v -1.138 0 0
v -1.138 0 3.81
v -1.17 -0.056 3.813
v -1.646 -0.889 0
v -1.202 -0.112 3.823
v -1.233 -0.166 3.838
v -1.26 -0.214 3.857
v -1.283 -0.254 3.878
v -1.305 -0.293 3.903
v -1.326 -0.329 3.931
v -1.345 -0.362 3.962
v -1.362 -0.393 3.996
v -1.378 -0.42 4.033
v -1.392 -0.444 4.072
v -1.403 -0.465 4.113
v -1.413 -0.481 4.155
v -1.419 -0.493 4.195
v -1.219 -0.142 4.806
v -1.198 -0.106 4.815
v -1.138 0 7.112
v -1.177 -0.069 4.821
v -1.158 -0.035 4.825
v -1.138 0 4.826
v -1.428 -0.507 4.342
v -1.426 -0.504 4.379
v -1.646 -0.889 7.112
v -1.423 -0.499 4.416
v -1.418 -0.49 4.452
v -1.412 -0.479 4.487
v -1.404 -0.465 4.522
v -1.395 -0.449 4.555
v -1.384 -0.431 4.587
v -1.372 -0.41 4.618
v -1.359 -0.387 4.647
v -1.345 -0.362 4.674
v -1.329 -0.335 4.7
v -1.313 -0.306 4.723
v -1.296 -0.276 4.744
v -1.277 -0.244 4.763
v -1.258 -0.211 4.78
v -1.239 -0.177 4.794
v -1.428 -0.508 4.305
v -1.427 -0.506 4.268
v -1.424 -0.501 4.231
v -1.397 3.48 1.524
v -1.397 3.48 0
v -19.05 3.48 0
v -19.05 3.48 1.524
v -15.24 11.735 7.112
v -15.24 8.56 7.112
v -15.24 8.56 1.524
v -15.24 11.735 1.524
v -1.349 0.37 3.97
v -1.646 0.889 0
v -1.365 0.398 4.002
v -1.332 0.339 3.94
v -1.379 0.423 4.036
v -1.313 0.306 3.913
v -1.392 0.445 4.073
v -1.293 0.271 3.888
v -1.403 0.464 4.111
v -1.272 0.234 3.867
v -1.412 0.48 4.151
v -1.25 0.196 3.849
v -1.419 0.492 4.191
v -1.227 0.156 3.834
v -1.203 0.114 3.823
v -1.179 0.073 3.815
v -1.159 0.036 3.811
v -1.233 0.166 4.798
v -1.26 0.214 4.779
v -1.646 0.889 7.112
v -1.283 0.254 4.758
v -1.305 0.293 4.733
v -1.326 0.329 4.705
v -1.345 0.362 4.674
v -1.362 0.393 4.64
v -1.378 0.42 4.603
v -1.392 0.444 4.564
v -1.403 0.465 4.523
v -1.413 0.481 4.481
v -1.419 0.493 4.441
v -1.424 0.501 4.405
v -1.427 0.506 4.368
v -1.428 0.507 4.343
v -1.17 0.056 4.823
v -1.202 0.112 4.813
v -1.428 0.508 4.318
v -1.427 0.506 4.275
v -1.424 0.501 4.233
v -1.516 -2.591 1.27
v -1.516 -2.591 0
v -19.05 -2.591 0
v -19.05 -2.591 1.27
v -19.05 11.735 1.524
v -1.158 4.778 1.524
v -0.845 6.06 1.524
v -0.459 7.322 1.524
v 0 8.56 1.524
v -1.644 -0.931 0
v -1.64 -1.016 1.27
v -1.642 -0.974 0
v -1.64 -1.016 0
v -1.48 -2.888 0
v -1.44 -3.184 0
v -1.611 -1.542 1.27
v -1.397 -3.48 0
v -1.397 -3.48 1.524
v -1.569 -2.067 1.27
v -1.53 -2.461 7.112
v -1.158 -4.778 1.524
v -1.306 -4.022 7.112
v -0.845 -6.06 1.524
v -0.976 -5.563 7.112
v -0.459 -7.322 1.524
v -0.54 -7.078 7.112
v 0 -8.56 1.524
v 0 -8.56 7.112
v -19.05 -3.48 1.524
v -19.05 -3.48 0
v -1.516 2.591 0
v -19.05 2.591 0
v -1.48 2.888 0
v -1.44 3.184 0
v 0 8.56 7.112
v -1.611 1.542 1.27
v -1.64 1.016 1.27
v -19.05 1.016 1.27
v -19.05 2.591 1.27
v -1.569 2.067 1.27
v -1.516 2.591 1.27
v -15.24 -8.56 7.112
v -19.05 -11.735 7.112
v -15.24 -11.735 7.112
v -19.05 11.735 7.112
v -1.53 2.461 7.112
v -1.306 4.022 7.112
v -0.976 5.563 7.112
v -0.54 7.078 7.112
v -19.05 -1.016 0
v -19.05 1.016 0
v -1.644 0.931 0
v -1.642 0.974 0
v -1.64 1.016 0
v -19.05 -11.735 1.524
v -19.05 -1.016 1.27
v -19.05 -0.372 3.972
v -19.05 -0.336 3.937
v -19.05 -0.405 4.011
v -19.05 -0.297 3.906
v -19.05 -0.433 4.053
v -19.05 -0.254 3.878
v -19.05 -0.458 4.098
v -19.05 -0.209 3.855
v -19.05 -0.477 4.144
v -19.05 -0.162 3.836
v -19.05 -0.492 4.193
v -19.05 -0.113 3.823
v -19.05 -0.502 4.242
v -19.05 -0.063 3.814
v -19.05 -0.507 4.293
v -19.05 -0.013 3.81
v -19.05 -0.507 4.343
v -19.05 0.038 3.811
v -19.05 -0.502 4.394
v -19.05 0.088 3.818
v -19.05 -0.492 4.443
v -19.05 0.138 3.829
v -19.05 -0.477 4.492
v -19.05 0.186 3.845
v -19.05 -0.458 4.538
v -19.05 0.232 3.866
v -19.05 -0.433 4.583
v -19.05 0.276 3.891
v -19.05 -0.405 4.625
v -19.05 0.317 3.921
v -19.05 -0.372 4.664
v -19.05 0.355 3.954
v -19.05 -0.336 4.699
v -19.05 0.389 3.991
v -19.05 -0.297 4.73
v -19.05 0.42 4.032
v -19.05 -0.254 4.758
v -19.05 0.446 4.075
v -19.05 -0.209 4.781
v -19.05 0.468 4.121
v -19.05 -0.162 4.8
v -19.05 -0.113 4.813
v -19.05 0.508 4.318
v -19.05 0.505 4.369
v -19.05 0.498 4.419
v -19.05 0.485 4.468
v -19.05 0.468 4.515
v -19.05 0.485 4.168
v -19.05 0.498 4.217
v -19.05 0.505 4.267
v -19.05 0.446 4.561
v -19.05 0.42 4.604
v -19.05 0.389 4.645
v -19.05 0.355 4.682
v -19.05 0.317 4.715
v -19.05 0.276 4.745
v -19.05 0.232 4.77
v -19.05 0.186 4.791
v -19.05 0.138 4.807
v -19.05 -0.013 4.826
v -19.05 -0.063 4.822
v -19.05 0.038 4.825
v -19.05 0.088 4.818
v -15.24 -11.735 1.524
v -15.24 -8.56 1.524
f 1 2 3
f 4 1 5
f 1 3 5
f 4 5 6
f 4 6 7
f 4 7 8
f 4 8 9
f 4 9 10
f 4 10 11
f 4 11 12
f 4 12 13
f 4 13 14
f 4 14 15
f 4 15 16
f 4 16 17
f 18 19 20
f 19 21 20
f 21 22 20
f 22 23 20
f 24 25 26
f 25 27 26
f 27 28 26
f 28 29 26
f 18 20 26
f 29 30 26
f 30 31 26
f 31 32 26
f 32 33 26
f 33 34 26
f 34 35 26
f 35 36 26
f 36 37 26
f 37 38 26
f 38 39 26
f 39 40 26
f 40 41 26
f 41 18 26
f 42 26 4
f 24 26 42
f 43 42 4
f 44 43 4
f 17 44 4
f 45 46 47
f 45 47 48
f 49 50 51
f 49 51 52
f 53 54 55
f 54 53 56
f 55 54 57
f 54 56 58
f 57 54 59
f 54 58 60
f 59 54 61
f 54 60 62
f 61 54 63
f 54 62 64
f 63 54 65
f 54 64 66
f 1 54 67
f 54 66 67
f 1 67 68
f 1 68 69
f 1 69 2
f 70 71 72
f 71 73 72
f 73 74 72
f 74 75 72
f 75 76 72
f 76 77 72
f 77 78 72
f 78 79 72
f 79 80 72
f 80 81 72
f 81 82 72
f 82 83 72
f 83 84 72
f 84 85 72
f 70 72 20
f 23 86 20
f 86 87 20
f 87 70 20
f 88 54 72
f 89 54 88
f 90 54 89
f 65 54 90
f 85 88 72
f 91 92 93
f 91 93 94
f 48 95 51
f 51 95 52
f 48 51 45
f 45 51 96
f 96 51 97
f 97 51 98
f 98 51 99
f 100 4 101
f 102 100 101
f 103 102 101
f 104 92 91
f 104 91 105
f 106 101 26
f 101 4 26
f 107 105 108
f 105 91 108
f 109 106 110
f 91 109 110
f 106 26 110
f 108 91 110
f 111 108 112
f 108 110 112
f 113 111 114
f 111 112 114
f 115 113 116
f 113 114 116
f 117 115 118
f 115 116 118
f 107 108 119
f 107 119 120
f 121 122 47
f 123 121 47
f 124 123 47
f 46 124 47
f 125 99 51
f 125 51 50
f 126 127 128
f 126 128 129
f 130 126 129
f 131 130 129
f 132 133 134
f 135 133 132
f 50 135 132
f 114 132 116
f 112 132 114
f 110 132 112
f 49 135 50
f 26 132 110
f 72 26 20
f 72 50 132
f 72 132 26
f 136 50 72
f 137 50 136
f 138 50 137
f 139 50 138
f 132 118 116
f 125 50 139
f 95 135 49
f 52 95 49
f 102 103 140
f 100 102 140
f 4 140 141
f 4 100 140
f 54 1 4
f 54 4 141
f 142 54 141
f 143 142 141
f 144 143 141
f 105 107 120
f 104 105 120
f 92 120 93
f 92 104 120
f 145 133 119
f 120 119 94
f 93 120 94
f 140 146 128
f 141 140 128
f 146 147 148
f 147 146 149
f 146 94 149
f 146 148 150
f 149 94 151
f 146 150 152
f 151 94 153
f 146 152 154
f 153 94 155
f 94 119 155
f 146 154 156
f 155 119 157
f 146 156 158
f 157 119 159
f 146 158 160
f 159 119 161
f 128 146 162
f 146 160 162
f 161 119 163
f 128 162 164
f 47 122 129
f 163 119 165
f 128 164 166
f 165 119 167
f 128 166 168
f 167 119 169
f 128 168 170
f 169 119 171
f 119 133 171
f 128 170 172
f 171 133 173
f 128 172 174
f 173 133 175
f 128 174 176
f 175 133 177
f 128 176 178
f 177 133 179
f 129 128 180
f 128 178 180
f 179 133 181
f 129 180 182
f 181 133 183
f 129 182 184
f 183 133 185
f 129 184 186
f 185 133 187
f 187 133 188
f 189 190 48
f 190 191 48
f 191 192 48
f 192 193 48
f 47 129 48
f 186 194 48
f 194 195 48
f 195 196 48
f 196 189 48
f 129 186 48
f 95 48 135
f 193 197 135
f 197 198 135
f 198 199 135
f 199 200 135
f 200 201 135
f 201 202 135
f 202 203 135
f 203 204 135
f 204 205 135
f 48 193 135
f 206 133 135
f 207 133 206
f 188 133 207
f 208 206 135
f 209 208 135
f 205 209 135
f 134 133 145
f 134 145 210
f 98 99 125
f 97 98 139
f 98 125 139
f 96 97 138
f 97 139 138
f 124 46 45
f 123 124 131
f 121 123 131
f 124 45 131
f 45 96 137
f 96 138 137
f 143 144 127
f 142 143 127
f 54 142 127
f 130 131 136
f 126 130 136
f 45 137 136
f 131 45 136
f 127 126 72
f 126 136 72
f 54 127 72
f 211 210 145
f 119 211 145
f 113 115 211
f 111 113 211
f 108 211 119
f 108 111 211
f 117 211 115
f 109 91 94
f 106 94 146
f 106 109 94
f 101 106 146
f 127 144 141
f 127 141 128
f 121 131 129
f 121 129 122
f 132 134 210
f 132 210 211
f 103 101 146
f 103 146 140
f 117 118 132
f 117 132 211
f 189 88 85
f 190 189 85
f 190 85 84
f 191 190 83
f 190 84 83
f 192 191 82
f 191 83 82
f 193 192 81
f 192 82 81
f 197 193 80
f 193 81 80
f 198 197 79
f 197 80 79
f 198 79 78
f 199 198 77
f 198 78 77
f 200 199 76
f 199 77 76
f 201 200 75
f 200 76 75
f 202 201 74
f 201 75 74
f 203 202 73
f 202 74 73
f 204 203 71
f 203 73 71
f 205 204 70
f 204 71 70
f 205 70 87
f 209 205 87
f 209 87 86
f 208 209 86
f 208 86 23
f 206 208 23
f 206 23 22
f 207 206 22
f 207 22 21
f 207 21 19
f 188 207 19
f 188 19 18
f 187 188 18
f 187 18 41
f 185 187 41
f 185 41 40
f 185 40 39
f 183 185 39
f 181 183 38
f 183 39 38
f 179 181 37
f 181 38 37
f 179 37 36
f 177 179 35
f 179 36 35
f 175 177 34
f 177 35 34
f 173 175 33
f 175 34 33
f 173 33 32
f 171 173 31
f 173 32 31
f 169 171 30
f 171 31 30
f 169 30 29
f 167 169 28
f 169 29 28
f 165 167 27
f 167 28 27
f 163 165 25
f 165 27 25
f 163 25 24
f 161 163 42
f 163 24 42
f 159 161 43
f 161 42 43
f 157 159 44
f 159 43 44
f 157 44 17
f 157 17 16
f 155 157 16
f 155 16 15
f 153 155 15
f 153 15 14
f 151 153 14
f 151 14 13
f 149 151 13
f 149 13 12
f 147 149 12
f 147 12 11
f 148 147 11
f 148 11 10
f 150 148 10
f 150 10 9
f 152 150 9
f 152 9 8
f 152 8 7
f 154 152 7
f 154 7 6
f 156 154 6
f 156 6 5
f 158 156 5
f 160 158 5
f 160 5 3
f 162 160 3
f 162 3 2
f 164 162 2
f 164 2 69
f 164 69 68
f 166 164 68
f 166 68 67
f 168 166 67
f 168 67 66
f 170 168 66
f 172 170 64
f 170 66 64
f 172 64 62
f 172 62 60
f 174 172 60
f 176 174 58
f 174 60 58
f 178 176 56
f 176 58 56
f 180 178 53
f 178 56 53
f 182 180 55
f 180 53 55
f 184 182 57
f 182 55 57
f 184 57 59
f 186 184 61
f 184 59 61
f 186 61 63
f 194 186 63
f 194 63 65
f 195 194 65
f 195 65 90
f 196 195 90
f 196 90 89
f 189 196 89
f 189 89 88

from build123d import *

# Parameters (mm, degrees)
F1_DEPTH = 19.05
F2_W     = 3.81
F2_H     = 3.175
F3_DEPTH = 5.588
F5_DEPTH = 7.113
F6_R     = 0.508
F7_DEPTH = 19.051


with BuildPart() as f1:
    # F0 (on Right) → F1 (new body)
    with BuildSketch(Plane.YZ):
        Polygon((-1.016, 1.27), (-1.016, 0), (1.016, 0), (1.016, 1.27), (2.5908, 1.27), (2.5908, 0), (3.4798, 0), (3.4798, 1.524), (8.5598, 1.524), (8.5598, 7.112), (-8.5598, 7.112), (-8.5598, 1.524), (-3.4798, 1.524), (-3.4798, 0), (-2.5908, 0), (-2.5908, 1.27), align=None)
    extrude(amount=-F1_DEPTH)

    # F2 (on face) → F3 (join, through all)
    with BuildSketch(Plane.XY.offset(7.112)):
        with Locations((-17.145, 10.1473)):
            Rectangle(F2_W, F2_H)
        with Locations((-17.145, -10.1473)):
            Rectangle(F2_W, F2_H)
    extrude(amount=-F3_DEPTH)

    # F4 (on face) → F5 (cut, through all)
    with BuildSketch(Plane.XY.offset(7.112)):
        with BuildLine():
            Line((0, -8.5598), (0, 8.5598))
            ThreePointArc((0, 8.5598), (-1.154422, 4.79553), (-1.645787, 0.889))
            Line((-1.645787, 0.889), (-1.137787, 0))
            Line((-1.137787, 0), (-1.645787, -0.889))
            ThreePointArc((-1.645787, -0.889), (-1.154422, -4.79553), (0, -8.5598))
        make_face()
    extrude(amount=-F5_DEPTH, mode=Mode.SUBTRACT)

    # F6 (on Right) → F7 (cut, through all)
    with BuildSketch(Plane.YZ):
        with Locations((0, 4.318)):
            Circle(F6_R)
    extrude(amount=-F7_DEPTH, mode=Mode.SUBTRACT)


solid = f1.part
